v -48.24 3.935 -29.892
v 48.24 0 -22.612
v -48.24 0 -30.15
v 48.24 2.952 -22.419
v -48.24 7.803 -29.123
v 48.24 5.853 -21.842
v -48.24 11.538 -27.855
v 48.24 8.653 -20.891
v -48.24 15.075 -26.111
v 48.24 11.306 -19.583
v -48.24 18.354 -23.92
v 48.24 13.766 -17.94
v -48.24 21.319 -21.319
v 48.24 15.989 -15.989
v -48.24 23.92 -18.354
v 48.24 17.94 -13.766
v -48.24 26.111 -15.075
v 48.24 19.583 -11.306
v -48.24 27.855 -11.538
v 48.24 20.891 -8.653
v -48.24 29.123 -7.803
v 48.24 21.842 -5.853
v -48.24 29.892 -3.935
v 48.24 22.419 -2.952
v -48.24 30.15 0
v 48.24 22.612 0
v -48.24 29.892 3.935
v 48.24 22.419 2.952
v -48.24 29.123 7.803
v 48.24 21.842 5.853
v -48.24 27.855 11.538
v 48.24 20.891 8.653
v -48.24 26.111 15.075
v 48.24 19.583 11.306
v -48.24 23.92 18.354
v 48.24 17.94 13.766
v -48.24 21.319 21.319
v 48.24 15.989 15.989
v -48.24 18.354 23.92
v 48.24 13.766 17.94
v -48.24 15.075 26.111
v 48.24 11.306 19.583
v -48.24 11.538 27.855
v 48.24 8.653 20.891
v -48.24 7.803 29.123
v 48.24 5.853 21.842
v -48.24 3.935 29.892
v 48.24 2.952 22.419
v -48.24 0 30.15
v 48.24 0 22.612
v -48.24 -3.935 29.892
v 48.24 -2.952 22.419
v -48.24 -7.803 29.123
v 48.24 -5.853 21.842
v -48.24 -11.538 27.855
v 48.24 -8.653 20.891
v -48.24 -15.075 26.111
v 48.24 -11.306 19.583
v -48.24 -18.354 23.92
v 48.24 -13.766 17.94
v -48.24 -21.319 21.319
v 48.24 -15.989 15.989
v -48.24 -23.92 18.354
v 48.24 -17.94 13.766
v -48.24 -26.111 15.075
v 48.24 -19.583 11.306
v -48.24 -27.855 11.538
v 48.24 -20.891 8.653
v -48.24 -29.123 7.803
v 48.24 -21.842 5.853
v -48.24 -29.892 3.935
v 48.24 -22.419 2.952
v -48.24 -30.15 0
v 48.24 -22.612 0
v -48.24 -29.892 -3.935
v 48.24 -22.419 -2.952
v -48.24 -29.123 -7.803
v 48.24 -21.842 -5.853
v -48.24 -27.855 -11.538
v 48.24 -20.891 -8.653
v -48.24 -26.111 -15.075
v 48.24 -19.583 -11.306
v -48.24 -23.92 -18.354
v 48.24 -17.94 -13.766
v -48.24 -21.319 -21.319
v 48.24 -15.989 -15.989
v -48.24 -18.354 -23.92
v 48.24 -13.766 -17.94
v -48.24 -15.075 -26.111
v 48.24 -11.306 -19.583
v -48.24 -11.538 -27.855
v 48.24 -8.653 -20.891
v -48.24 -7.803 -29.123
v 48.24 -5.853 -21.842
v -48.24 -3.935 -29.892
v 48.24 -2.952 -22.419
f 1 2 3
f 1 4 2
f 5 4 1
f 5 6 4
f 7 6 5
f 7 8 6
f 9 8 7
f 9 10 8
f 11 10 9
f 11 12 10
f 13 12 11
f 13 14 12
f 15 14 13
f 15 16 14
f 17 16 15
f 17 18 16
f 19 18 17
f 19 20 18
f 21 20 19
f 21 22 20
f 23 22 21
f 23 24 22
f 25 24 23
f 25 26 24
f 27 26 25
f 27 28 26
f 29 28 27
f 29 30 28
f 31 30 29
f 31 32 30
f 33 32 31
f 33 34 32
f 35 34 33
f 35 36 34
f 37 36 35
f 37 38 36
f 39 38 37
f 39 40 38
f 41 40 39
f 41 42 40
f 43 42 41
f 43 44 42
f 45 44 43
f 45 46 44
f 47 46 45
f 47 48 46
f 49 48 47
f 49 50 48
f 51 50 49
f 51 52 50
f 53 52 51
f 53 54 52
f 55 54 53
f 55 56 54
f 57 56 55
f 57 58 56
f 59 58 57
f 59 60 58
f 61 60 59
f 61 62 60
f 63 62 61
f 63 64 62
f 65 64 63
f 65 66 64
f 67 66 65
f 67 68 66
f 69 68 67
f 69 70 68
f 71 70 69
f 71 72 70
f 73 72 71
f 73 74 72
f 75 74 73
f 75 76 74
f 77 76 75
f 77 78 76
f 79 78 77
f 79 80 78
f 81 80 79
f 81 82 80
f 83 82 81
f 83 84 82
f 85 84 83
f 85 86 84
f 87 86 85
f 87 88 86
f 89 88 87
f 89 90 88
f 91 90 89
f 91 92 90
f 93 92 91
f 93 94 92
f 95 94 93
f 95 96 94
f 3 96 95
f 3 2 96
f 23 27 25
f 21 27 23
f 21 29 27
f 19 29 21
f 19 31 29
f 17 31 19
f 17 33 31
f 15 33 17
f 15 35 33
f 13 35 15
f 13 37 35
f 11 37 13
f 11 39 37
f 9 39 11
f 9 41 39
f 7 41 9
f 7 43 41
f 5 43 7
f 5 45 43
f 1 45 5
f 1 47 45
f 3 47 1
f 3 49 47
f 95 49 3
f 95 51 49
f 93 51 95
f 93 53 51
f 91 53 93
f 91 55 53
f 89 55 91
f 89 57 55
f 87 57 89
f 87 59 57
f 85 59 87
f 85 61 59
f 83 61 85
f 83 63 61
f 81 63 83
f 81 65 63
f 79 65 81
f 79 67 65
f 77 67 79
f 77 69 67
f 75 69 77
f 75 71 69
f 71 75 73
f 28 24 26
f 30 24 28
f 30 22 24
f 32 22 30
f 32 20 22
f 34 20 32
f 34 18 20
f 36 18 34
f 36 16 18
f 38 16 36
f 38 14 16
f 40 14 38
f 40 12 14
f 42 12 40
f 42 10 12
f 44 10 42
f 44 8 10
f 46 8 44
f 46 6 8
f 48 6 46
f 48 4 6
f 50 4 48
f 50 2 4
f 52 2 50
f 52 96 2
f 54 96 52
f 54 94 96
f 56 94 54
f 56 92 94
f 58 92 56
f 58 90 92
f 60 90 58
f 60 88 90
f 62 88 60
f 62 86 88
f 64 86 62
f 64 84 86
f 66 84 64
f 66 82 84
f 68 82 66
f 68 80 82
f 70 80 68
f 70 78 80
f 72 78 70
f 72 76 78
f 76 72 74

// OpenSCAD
// Auto-generated by scripts/author_from_manifest.py (Phase D.3).
// Source: data/phase_d_manifest.json (sku_intent='anvil-concentric-reducer-threaded-2x1-1/2in').
// Do not hand-edit — regenerate from the manifest.
//
// @part anvil_concentric_reducer_threaded_2x1_1_2in
// @kind fitting
// @category fitting.reducer
// @display-name "Anvil FIG 7 Threaded Concentric Reducer 2x1-1/2\""
// @mfg anvil_international
// @mfg-pn FIG_7_2x1-1/2
// @listing UL FM
// @price-usd 18.00
// @install-minutes 6
// @crew journeyman
// @param size_in number default=2 label="Size" unit="in"
// @port inlet position=[-0.05,0,0] direction=[-1,0,0] style=grooved size_in=2 role=run_a
// @port outlet position=[0.05,0,0] direction=[1,0,0] style=grooved size_in=2 role=run_b

size_in = 2.0;

function od_mm(nps) =
    nps ==   1  ? 33.4 :
    nps == 1.25 ? 42.2 :
    nps == 1.5  ? 48.3 :
    nps ==   2  ? 60.3 :
    nps == 2.5  ? 73.0 :
    nps ==   3  ? 88.9 :
    nps ==   4  ? 114.3 :
    nps ==   6  ? 168.3 : 60.3;

od_big   = od_mm(size_in);
od_small = od_big * 0.75;
len_mm   = od_big * 1.6;

rotate([0, 90, 0])
    cylinder(h = len_mm, d1 = od_big, d2 = od_small, center = true, $fn = 48);
